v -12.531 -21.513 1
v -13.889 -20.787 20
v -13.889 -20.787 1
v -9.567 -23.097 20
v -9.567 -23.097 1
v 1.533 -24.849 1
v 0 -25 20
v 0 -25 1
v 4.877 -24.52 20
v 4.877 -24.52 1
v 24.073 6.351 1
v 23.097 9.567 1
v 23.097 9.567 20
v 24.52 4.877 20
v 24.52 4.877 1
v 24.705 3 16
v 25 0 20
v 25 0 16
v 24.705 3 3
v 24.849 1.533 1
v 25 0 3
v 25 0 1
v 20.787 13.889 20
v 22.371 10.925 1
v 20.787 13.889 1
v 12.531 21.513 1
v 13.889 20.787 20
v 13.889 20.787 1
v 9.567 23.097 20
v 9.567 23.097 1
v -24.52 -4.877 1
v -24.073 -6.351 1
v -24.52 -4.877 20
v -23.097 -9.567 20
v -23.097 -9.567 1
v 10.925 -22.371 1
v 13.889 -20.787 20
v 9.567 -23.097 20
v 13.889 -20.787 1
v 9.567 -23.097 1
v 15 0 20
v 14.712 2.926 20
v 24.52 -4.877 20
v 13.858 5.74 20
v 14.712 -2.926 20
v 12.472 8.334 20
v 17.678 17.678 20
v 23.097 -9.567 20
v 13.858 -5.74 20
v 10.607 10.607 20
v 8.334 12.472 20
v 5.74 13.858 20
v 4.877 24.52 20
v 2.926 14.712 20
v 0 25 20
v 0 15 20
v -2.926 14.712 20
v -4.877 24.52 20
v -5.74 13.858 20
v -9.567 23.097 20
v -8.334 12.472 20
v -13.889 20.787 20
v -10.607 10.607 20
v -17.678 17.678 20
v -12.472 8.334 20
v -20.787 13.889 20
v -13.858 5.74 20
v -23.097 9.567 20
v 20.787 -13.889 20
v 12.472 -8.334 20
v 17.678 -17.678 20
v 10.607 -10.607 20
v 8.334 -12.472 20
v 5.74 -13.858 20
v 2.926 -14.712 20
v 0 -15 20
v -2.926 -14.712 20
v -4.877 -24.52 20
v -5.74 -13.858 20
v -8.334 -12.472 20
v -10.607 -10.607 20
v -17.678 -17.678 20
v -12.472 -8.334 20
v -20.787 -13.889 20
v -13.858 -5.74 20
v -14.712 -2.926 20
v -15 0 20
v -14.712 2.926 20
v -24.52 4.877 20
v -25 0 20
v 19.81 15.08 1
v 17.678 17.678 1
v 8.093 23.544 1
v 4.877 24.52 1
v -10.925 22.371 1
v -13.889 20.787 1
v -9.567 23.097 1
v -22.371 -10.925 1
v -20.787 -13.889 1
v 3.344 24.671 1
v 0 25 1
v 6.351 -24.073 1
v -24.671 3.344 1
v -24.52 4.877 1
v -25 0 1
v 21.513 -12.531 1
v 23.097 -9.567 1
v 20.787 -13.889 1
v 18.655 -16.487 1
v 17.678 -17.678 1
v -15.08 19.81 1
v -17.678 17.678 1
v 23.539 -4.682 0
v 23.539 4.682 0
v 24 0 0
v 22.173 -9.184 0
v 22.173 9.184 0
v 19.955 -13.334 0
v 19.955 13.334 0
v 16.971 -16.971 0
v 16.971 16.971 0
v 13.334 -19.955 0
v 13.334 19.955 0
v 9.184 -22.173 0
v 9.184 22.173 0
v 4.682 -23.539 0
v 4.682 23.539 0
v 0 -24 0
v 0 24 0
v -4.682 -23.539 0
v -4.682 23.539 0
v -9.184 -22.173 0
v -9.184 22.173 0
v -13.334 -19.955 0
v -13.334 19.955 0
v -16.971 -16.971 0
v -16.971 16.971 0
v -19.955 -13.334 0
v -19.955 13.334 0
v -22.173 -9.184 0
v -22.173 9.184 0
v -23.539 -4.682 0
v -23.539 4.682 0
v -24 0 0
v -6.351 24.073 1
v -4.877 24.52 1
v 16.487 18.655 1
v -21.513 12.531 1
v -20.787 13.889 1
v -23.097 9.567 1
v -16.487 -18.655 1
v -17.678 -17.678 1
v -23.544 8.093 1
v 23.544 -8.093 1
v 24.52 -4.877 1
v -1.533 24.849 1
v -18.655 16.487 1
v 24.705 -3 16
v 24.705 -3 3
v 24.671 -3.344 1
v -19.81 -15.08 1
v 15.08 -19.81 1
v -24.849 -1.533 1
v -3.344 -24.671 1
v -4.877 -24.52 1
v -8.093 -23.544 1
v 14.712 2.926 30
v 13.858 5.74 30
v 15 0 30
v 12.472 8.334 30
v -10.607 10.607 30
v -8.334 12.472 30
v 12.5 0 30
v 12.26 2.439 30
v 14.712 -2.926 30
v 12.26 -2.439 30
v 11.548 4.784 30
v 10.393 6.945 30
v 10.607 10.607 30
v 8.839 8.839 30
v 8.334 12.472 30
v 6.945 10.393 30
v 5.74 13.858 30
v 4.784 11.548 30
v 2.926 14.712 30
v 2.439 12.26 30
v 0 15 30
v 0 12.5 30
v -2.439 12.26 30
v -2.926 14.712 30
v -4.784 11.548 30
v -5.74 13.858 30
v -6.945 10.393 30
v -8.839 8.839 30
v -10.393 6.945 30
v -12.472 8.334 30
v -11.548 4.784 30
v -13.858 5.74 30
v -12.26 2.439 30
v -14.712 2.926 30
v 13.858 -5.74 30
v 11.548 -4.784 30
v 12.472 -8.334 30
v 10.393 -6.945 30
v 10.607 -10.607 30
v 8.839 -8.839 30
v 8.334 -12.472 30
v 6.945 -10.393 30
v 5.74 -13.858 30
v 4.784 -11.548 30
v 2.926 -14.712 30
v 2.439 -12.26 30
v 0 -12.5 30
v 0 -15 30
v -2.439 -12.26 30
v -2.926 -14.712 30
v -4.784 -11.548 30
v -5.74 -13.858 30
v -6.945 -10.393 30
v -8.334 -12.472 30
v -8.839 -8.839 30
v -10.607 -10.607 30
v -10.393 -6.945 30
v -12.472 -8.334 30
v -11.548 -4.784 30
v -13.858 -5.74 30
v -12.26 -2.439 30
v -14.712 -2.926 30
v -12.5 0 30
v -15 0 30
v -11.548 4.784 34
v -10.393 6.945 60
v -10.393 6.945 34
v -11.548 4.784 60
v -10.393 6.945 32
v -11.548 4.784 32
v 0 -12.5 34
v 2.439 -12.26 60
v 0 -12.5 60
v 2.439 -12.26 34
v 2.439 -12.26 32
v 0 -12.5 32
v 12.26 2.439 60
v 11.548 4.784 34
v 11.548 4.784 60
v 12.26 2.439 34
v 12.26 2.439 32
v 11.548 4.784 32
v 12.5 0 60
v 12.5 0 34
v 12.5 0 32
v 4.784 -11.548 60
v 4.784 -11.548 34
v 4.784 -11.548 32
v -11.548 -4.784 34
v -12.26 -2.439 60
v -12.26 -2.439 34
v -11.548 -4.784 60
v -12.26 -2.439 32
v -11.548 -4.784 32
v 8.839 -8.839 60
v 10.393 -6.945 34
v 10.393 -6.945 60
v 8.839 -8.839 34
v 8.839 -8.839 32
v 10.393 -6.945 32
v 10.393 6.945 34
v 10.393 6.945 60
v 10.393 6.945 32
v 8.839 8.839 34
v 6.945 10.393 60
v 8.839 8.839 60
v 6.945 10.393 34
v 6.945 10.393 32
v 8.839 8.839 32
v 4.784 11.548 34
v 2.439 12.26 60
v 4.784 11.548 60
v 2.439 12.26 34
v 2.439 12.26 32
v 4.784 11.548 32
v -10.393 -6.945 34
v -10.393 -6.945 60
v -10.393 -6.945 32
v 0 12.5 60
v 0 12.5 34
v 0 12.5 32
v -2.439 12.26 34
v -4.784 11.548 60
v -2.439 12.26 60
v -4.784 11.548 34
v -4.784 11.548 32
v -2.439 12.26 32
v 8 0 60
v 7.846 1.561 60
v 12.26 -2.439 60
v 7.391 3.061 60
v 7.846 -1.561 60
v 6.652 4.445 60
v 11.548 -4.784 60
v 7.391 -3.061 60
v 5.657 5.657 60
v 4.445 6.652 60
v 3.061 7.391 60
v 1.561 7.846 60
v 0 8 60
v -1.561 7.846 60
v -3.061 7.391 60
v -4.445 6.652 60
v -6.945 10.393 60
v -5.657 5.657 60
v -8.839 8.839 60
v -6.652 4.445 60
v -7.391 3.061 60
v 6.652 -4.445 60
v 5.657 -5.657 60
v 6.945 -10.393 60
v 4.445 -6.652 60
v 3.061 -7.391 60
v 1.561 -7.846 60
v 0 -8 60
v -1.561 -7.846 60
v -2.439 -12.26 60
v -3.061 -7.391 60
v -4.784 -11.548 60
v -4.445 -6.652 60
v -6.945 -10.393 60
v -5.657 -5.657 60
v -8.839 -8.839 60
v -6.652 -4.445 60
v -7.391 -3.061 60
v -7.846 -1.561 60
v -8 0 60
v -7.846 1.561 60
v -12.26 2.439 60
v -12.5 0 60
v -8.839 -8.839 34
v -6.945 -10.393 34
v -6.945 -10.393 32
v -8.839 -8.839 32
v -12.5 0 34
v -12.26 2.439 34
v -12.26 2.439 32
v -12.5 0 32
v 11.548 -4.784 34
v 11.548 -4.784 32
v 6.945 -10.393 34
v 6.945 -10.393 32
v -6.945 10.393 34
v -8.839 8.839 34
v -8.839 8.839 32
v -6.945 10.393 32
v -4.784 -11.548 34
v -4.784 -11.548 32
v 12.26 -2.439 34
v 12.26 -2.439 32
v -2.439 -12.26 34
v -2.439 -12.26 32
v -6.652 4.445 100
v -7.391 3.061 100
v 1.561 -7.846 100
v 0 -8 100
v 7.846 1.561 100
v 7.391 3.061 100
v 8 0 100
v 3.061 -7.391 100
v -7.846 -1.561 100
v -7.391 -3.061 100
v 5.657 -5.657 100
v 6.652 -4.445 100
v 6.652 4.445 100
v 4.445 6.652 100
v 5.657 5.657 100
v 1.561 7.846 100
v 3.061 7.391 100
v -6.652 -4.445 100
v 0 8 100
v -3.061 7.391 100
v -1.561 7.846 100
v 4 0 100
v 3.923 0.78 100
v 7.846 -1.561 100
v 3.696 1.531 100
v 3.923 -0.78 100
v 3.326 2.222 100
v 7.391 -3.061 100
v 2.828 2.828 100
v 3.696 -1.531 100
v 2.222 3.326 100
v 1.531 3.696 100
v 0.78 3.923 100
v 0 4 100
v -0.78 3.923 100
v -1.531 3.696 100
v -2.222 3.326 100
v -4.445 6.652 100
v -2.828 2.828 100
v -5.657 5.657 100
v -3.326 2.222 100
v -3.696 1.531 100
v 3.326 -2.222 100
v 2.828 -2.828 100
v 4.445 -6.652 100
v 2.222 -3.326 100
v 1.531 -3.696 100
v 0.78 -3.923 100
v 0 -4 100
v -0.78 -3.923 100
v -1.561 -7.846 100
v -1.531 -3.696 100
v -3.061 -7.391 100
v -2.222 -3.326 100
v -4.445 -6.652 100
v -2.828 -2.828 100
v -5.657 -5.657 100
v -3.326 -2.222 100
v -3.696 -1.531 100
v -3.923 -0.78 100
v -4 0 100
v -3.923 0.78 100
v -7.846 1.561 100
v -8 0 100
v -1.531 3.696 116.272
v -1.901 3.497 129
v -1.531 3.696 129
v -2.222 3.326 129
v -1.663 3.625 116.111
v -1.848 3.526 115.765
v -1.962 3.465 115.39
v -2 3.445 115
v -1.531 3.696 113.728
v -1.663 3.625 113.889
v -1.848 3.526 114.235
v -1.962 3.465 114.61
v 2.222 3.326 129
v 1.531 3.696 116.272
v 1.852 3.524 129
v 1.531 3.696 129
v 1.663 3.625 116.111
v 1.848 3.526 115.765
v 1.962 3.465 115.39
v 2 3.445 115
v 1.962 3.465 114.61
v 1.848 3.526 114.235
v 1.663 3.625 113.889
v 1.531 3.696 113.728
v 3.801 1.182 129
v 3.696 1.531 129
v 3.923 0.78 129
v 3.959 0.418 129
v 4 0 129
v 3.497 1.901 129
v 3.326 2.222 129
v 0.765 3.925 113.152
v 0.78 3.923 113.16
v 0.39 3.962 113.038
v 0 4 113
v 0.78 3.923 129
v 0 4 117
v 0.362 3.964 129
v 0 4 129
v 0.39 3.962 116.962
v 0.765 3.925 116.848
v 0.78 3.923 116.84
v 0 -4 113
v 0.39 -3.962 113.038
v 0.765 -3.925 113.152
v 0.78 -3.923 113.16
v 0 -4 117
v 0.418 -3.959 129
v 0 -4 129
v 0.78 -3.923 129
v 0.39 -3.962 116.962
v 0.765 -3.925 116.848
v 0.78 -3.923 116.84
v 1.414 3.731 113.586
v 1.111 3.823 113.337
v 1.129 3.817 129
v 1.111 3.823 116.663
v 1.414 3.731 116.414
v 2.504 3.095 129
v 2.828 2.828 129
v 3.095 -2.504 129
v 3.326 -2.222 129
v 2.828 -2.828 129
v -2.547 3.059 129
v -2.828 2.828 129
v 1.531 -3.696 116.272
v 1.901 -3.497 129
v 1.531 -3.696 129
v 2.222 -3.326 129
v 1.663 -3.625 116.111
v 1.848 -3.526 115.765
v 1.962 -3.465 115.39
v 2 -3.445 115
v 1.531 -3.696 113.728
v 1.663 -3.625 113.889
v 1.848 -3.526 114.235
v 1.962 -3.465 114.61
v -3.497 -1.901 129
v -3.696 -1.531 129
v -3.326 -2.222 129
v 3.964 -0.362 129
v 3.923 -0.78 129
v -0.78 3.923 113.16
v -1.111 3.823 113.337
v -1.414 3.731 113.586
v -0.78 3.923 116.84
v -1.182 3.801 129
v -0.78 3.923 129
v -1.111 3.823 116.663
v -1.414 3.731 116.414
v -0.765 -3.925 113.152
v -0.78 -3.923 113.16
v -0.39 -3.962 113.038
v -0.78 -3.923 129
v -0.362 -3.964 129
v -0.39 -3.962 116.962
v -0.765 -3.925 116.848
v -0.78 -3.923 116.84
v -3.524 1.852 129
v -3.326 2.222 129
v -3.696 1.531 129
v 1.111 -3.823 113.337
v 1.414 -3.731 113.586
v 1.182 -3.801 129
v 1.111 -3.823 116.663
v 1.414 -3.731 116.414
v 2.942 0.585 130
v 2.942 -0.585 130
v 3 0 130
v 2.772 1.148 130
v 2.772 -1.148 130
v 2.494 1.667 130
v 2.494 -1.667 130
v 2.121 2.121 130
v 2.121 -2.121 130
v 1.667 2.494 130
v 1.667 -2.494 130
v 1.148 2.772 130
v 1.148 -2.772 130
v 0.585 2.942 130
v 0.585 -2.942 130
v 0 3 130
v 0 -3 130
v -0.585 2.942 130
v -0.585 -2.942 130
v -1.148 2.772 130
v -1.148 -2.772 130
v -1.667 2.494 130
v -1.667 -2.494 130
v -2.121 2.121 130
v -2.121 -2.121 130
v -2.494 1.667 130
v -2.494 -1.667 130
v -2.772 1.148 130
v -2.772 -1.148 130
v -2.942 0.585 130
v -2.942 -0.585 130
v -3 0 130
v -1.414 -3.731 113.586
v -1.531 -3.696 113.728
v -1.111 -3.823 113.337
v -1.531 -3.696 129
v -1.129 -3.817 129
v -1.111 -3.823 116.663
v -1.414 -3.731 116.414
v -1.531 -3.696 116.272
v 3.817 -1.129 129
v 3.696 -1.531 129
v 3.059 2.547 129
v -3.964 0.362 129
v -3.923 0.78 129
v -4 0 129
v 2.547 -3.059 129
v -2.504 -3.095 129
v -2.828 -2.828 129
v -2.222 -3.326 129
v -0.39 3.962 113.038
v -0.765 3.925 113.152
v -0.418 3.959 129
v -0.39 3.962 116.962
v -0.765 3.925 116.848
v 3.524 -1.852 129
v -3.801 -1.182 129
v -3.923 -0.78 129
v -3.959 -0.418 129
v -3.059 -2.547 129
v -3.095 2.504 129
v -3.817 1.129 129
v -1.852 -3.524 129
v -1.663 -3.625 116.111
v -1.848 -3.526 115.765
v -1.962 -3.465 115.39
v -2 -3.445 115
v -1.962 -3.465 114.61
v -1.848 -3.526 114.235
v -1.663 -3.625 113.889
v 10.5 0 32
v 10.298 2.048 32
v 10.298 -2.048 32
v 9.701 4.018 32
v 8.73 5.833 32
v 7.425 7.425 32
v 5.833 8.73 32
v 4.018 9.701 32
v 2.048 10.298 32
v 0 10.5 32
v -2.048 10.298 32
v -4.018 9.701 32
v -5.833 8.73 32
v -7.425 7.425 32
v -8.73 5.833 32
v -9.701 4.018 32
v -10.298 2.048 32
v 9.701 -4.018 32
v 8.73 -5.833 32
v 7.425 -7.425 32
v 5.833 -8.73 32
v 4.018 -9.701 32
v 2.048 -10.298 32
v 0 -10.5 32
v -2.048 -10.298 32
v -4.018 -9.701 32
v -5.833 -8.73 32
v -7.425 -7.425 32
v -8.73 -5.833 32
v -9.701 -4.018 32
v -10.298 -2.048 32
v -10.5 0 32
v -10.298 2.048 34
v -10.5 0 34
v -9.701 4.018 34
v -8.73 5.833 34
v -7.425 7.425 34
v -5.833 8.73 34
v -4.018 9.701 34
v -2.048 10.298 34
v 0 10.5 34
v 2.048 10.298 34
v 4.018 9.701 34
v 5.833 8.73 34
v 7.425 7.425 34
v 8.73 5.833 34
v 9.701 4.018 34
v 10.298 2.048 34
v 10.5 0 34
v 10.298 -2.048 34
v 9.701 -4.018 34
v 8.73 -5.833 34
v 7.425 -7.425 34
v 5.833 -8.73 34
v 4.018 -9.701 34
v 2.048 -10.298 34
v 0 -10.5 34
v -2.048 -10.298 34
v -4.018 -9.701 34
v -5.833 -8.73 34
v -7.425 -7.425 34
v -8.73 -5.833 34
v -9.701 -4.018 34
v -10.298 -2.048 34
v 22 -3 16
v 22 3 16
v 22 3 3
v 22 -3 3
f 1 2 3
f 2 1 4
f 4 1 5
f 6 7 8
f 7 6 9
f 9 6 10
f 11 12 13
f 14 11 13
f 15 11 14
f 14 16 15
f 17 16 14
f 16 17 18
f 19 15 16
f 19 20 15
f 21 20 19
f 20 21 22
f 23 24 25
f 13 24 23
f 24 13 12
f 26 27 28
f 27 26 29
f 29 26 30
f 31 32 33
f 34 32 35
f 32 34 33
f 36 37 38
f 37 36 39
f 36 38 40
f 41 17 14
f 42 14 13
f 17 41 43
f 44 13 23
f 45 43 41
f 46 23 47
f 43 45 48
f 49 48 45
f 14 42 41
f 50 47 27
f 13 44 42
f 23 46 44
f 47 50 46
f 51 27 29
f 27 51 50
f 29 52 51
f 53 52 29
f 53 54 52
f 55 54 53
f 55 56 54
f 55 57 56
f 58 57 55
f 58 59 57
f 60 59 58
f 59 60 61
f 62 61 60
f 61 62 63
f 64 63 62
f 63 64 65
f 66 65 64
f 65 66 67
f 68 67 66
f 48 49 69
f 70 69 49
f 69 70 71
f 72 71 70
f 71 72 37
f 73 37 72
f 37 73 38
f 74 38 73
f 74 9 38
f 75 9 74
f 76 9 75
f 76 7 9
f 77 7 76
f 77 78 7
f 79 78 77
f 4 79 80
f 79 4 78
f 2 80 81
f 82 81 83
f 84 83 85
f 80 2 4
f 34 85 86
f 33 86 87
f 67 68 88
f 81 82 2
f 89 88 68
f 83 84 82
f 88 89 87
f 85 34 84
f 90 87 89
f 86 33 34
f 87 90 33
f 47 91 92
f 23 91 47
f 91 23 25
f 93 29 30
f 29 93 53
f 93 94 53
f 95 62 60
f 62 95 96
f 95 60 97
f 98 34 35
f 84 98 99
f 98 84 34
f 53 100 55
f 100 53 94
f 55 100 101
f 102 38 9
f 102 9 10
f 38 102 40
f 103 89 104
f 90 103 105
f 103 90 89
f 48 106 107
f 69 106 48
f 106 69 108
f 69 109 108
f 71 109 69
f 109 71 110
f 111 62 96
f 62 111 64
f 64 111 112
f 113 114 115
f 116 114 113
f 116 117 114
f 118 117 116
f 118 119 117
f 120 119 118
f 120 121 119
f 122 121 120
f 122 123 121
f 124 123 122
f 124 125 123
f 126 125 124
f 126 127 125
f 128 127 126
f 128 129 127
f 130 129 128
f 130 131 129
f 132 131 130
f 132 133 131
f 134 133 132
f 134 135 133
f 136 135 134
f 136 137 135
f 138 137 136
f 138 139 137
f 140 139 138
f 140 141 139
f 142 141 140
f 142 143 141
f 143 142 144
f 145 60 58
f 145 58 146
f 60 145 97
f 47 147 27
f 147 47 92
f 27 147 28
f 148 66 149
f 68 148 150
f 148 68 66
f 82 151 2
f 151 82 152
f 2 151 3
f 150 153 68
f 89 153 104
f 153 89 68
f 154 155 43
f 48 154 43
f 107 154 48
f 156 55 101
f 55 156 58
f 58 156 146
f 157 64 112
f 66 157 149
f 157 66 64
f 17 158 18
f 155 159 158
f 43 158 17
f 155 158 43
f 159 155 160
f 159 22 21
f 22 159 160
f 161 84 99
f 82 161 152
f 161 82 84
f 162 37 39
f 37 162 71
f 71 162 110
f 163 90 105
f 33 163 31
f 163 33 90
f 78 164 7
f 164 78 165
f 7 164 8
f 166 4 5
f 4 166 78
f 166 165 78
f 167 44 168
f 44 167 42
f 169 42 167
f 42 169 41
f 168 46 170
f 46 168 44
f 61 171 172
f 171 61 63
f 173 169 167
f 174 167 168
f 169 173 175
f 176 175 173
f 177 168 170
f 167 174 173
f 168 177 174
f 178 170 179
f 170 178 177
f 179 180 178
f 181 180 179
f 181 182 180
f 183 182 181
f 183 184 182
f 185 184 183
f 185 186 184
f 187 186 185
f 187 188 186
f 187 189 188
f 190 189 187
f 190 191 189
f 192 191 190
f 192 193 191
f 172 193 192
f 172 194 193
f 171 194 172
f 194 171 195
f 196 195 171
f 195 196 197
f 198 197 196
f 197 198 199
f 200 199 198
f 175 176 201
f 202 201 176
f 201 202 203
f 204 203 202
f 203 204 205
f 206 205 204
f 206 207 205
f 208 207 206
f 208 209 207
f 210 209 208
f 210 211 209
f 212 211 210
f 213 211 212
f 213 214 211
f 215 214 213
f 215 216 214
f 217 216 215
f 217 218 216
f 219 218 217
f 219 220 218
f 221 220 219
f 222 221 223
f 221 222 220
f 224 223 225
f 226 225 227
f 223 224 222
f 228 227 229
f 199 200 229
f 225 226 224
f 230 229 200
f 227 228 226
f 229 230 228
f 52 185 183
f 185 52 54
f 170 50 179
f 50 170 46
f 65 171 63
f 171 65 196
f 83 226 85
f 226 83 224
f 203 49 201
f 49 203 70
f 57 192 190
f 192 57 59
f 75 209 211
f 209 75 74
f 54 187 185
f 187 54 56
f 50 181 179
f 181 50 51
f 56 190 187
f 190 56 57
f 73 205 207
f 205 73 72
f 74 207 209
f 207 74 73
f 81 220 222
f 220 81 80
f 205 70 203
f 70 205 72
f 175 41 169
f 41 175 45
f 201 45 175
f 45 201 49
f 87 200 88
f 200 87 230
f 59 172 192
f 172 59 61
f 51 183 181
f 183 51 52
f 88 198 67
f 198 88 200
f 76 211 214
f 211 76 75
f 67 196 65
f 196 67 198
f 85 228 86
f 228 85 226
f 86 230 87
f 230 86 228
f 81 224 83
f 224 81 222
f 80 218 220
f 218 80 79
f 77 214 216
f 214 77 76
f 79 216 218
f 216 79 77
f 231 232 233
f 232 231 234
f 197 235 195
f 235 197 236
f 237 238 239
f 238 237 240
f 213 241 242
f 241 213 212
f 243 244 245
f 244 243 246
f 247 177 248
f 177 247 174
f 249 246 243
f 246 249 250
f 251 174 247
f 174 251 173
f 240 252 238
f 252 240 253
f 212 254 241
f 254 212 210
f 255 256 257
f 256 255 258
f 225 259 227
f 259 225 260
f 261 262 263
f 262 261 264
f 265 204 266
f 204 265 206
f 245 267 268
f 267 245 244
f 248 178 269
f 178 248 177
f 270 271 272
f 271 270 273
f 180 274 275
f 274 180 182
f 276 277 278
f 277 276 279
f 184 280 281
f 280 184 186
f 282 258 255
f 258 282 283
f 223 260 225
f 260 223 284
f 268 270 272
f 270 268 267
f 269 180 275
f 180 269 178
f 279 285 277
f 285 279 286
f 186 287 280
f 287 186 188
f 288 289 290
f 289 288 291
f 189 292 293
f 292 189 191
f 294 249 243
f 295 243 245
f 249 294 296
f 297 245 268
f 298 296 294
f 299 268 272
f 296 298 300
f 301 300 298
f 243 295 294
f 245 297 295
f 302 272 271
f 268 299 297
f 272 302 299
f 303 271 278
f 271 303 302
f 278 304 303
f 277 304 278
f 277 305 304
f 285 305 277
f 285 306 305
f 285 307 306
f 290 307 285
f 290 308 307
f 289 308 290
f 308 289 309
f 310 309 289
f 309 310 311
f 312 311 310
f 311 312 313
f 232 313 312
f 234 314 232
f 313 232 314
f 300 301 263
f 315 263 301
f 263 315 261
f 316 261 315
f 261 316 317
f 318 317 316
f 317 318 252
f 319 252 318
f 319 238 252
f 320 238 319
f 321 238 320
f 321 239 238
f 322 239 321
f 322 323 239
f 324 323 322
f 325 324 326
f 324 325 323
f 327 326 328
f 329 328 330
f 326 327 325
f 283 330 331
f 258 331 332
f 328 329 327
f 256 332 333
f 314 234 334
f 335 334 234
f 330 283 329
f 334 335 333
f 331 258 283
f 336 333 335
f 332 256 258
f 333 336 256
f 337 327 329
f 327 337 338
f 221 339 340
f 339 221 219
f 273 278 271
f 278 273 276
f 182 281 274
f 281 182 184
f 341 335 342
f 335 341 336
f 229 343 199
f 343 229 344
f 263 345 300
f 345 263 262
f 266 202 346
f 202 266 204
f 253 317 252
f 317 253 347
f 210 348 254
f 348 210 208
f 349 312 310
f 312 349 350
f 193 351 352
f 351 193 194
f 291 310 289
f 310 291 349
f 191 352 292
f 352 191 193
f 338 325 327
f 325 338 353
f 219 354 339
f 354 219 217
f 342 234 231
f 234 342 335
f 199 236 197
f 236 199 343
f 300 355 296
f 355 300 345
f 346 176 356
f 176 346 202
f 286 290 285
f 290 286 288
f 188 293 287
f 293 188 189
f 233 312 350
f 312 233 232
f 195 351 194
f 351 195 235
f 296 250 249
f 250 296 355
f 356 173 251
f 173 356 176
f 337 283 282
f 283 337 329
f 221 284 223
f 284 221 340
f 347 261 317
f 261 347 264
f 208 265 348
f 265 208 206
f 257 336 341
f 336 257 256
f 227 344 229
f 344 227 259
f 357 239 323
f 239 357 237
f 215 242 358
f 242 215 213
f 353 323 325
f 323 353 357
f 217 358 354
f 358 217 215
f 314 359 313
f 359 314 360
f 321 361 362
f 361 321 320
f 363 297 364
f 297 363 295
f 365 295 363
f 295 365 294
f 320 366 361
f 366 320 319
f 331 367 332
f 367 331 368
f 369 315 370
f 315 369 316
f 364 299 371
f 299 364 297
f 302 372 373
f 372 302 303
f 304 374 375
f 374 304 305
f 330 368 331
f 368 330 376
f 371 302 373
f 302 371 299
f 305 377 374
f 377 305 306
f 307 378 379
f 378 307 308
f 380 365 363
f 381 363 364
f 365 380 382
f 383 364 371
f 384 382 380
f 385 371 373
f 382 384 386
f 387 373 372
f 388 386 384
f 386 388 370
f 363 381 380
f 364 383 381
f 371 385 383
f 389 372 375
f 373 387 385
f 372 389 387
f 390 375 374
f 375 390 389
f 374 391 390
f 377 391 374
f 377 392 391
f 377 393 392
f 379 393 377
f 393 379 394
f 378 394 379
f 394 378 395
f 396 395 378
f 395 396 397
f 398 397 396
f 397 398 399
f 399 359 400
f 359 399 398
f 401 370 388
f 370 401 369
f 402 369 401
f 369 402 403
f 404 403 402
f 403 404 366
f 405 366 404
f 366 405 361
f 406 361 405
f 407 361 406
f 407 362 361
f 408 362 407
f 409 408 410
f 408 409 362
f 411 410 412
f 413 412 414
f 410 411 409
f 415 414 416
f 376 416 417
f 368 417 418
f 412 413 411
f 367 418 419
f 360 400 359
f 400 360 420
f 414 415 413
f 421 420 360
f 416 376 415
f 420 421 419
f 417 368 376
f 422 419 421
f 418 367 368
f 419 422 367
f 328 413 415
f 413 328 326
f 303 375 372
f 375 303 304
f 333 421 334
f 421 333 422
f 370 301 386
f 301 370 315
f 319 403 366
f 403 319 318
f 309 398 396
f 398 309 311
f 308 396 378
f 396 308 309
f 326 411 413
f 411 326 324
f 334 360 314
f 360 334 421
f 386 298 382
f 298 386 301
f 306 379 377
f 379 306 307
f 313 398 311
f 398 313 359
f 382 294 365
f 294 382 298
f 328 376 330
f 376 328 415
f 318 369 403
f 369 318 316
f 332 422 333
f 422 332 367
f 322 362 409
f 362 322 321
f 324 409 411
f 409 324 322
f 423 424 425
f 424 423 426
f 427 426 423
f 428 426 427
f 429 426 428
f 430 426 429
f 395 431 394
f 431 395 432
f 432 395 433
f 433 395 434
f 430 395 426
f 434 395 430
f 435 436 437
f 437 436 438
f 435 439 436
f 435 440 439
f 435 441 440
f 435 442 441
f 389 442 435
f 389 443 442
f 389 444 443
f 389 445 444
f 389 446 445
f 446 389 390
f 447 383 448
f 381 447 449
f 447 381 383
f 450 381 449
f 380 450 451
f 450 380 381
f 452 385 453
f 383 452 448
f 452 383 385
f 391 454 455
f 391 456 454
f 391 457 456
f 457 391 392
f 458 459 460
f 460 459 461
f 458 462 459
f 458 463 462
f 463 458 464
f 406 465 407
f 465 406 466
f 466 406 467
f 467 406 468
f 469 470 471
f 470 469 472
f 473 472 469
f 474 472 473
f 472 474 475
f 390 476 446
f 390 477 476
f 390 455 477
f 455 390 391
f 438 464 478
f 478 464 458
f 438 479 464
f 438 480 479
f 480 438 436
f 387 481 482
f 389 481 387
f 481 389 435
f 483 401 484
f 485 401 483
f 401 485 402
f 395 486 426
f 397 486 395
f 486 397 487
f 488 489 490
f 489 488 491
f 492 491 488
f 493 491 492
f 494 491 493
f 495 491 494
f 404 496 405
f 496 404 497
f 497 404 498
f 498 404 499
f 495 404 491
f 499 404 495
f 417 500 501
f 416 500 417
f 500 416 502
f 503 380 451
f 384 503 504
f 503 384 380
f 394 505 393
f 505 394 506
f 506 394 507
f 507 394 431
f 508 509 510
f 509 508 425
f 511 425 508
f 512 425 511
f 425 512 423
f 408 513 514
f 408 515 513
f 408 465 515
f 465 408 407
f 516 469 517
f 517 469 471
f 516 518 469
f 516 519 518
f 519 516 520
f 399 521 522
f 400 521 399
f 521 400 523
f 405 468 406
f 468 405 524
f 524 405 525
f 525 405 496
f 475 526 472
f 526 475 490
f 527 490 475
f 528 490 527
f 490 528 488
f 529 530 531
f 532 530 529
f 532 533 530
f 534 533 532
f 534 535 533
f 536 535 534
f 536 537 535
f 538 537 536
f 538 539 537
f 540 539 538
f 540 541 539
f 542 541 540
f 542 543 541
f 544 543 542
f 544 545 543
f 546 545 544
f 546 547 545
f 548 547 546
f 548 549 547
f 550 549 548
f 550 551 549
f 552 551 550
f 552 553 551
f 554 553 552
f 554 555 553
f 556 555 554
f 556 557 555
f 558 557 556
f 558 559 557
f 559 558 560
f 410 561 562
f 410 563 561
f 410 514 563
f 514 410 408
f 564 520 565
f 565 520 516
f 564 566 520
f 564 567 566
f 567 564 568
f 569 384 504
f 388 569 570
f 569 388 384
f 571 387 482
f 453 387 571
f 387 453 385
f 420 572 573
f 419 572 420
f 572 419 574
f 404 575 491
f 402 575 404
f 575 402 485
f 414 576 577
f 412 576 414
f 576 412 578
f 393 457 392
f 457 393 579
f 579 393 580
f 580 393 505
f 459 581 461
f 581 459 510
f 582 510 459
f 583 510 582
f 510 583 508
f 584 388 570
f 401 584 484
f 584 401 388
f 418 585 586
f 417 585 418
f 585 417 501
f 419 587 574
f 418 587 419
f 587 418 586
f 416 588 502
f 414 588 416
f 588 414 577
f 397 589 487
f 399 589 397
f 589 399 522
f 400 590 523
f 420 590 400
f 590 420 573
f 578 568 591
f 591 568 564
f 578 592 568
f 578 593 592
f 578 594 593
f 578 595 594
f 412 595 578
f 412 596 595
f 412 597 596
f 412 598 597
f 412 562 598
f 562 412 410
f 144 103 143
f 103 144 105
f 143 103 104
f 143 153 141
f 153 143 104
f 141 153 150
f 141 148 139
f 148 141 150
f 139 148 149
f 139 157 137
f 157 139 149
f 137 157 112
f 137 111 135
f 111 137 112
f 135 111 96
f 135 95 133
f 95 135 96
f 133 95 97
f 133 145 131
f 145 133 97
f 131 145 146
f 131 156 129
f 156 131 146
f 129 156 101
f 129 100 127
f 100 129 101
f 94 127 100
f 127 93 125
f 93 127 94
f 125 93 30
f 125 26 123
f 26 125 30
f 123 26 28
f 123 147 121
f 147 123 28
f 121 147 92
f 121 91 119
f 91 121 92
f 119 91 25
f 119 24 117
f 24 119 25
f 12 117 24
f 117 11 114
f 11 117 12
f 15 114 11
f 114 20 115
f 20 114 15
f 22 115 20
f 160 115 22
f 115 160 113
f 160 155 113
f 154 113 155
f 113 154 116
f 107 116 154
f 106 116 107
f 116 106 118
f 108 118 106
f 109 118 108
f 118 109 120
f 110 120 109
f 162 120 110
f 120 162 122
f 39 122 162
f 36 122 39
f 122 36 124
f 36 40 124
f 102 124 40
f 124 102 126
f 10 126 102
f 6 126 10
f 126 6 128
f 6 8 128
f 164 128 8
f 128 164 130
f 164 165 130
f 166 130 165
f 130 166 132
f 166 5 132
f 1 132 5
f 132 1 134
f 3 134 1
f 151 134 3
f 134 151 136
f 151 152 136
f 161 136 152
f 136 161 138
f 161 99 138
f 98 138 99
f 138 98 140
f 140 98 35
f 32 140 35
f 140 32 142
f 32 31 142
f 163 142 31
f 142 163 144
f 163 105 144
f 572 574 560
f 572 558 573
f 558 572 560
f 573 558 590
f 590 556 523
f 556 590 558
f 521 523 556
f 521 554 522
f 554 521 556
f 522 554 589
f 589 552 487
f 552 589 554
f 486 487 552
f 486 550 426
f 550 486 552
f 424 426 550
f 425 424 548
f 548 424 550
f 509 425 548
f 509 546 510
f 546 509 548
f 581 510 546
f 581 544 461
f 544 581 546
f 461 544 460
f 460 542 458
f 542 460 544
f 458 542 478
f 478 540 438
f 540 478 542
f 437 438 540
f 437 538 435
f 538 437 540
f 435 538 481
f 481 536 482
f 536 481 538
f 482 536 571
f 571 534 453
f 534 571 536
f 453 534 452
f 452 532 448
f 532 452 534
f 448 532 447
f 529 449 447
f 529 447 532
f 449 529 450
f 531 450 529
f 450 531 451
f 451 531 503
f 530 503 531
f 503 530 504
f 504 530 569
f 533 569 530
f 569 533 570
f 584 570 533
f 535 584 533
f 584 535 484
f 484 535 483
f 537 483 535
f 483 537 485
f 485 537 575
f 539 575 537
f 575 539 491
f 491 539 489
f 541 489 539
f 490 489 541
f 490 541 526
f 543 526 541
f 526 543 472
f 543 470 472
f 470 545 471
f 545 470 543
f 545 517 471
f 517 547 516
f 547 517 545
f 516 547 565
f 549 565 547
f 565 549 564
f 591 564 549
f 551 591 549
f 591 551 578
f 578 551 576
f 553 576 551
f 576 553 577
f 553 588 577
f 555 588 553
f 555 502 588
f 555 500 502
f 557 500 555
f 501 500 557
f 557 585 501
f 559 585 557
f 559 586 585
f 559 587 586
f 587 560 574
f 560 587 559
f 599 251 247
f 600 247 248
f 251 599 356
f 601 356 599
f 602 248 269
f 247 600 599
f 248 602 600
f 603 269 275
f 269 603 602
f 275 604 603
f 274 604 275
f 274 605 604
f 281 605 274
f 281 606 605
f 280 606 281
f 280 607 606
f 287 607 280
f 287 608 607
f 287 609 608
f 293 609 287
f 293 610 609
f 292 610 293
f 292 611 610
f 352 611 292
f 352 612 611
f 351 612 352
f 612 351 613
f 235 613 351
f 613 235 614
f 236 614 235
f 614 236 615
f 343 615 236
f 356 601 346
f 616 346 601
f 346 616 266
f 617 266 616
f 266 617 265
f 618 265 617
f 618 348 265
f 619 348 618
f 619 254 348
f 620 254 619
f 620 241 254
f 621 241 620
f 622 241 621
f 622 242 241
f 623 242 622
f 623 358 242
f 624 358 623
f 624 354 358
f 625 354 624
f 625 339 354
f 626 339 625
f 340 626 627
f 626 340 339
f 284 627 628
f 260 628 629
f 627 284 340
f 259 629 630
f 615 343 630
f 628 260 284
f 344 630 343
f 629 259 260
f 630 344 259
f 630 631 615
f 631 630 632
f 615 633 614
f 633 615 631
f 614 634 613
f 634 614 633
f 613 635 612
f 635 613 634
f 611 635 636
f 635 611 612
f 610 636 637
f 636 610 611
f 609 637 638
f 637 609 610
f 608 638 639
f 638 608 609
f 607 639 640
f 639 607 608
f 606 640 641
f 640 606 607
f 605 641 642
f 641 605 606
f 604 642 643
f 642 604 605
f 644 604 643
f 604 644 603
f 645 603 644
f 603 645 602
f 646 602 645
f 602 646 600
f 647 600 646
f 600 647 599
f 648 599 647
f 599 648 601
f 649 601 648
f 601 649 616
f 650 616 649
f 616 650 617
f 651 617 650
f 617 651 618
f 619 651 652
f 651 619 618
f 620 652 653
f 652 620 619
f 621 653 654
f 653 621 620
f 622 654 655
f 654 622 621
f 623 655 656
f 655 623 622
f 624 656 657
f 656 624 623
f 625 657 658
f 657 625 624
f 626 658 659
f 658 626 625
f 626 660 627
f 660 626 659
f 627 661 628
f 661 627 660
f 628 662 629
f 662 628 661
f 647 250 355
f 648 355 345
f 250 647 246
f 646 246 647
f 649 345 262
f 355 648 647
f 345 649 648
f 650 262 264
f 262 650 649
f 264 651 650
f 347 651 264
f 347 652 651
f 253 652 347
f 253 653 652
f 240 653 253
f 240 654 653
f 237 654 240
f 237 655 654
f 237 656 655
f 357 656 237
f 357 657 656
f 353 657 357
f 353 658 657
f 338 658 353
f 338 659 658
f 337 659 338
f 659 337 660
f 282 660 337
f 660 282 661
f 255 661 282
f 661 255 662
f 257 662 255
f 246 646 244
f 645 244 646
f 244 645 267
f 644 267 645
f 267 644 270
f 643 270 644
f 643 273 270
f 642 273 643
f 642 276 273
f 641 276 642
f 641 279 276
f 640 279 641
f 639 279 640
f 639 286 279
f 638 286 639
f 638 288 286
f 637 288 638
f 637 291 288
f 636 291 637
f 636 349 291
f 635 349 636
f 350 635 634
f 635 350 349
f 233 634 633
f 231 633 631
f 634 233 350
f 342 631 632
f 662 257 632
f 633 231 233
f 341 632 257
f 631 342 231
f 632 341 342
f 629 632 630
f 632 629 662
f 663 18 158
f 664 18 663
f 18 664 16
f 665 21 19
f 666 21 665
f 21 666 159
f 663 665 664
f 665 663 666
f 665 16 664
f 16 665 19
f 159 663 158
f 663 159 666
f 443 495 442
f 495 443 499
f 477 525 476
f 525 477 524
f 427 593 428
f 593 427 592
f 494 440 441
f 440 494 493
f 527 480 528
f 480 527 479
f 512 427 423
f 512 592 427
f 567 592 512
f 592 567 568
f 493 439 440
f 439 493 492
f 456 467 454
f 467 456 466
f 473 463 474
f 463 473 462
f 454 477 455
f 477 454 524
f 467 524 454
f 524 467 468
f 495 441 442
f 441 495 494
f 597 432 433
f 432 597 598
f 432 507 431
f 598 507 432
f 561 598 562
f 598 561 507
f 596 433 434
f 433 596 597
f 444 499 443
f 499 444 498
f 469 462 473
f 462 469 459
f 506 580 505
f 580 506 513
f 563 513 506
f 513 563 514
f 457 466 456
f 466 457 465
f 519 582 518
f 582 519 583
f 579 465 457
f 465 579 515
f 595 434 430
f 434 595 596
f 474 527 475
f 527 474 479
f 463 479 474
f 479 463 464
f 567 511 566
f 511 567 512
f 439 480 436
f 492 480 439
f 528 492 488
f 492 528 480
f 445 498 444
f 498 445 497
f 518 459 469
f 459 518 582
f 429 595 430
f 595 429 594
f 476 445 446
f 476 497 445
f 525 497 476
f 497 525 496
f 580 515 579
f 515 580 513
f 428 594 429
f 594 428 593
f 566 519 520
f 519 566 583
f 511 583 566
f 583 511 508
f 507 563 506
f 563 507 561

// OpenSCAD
$fn = 32;

// ----------------------------------------------------------------------
// Stepped shaft: diameters 50, 30, 25, 16, 8 mm, 130 mm long
// ----------------------------------------------------------------------

// --- parameters (mm) ---
d1 = 50;                  // step 1 diameter
len1 = 20;                // step 1 length
d2 = 30;                  // step 2 diameter
len2 = 10;                // step 2 length
d3 = 25;                  // step 3 diameter
len3 = 30;                // step 3 length
d4 = 16;                  // step 4 diameter
len4 = 40;                // step 4 length
d5 = 8;                   // step 5 diameter
len5 = 30;                // step 5 length
total = 130;              // overall length
chamfer = 1;              // end chamfer
groove_r = 12.5;          // groove radius
groove_z = 32;            // groove position from the end
groove_w = 2;             // groove width
groove_d = 2;             // groove depth
key_w = 6;                // keyway width
key_d = 3;                // keyway depth
key_len = 13;             // keyway length
key_z = 3;                // keyway start along the shaft
cross_d = 4;              // cross pin hole
cross_z = 115;            // cross hole position

difference() {
  /* turned body: stacked cylinders, every step sunk into the bigger one */
  union() {
    cylinder(h = len1, d = d1);
    translate([0, 0, 19.6]) cylinder(h = 10.4, d = d2);
    translate([0, 0, 29.6]) cylinder(h = 30.4, d = d3);
    translate([0, 0, 59.6]) cylinder(h = 40.4, d = d4);
    translate([0, 0, 99.6]) cylinder(h = 30.4, d = d5);
  }
  /* bottom chamfer ring cut */
  rotate_extrude() translate([24, -2.5]) polygon([[0, 0], [3.5, 0], [3.5, 6], [0, 2.5]]);
  /* top chamfer ring cut */
  rotate_extrude() translate([3, 130]) polygon([[0, 0], [3.5, -3.5], [3.5, 2.5], [0, 2.5]]);
  /* circlip groove just behind the shoulder */
  rotate_extrude() translate([groove_r - groove_d, groove_z]) square([groove_d + 2.5, groove_w]);
  /* keyway milled along the first step */
  translate([d1 / 2 - key_d, -key_w / 2, key_z]) cube([key_d + 2.5, key_w, key_len]);
  /* cross pin hole through the small step */
  translate([0, 0, cross_z]) rotate([90, 0, 0]) cylinder(h = d5 + 5, d = cross_d, center = true);
}
